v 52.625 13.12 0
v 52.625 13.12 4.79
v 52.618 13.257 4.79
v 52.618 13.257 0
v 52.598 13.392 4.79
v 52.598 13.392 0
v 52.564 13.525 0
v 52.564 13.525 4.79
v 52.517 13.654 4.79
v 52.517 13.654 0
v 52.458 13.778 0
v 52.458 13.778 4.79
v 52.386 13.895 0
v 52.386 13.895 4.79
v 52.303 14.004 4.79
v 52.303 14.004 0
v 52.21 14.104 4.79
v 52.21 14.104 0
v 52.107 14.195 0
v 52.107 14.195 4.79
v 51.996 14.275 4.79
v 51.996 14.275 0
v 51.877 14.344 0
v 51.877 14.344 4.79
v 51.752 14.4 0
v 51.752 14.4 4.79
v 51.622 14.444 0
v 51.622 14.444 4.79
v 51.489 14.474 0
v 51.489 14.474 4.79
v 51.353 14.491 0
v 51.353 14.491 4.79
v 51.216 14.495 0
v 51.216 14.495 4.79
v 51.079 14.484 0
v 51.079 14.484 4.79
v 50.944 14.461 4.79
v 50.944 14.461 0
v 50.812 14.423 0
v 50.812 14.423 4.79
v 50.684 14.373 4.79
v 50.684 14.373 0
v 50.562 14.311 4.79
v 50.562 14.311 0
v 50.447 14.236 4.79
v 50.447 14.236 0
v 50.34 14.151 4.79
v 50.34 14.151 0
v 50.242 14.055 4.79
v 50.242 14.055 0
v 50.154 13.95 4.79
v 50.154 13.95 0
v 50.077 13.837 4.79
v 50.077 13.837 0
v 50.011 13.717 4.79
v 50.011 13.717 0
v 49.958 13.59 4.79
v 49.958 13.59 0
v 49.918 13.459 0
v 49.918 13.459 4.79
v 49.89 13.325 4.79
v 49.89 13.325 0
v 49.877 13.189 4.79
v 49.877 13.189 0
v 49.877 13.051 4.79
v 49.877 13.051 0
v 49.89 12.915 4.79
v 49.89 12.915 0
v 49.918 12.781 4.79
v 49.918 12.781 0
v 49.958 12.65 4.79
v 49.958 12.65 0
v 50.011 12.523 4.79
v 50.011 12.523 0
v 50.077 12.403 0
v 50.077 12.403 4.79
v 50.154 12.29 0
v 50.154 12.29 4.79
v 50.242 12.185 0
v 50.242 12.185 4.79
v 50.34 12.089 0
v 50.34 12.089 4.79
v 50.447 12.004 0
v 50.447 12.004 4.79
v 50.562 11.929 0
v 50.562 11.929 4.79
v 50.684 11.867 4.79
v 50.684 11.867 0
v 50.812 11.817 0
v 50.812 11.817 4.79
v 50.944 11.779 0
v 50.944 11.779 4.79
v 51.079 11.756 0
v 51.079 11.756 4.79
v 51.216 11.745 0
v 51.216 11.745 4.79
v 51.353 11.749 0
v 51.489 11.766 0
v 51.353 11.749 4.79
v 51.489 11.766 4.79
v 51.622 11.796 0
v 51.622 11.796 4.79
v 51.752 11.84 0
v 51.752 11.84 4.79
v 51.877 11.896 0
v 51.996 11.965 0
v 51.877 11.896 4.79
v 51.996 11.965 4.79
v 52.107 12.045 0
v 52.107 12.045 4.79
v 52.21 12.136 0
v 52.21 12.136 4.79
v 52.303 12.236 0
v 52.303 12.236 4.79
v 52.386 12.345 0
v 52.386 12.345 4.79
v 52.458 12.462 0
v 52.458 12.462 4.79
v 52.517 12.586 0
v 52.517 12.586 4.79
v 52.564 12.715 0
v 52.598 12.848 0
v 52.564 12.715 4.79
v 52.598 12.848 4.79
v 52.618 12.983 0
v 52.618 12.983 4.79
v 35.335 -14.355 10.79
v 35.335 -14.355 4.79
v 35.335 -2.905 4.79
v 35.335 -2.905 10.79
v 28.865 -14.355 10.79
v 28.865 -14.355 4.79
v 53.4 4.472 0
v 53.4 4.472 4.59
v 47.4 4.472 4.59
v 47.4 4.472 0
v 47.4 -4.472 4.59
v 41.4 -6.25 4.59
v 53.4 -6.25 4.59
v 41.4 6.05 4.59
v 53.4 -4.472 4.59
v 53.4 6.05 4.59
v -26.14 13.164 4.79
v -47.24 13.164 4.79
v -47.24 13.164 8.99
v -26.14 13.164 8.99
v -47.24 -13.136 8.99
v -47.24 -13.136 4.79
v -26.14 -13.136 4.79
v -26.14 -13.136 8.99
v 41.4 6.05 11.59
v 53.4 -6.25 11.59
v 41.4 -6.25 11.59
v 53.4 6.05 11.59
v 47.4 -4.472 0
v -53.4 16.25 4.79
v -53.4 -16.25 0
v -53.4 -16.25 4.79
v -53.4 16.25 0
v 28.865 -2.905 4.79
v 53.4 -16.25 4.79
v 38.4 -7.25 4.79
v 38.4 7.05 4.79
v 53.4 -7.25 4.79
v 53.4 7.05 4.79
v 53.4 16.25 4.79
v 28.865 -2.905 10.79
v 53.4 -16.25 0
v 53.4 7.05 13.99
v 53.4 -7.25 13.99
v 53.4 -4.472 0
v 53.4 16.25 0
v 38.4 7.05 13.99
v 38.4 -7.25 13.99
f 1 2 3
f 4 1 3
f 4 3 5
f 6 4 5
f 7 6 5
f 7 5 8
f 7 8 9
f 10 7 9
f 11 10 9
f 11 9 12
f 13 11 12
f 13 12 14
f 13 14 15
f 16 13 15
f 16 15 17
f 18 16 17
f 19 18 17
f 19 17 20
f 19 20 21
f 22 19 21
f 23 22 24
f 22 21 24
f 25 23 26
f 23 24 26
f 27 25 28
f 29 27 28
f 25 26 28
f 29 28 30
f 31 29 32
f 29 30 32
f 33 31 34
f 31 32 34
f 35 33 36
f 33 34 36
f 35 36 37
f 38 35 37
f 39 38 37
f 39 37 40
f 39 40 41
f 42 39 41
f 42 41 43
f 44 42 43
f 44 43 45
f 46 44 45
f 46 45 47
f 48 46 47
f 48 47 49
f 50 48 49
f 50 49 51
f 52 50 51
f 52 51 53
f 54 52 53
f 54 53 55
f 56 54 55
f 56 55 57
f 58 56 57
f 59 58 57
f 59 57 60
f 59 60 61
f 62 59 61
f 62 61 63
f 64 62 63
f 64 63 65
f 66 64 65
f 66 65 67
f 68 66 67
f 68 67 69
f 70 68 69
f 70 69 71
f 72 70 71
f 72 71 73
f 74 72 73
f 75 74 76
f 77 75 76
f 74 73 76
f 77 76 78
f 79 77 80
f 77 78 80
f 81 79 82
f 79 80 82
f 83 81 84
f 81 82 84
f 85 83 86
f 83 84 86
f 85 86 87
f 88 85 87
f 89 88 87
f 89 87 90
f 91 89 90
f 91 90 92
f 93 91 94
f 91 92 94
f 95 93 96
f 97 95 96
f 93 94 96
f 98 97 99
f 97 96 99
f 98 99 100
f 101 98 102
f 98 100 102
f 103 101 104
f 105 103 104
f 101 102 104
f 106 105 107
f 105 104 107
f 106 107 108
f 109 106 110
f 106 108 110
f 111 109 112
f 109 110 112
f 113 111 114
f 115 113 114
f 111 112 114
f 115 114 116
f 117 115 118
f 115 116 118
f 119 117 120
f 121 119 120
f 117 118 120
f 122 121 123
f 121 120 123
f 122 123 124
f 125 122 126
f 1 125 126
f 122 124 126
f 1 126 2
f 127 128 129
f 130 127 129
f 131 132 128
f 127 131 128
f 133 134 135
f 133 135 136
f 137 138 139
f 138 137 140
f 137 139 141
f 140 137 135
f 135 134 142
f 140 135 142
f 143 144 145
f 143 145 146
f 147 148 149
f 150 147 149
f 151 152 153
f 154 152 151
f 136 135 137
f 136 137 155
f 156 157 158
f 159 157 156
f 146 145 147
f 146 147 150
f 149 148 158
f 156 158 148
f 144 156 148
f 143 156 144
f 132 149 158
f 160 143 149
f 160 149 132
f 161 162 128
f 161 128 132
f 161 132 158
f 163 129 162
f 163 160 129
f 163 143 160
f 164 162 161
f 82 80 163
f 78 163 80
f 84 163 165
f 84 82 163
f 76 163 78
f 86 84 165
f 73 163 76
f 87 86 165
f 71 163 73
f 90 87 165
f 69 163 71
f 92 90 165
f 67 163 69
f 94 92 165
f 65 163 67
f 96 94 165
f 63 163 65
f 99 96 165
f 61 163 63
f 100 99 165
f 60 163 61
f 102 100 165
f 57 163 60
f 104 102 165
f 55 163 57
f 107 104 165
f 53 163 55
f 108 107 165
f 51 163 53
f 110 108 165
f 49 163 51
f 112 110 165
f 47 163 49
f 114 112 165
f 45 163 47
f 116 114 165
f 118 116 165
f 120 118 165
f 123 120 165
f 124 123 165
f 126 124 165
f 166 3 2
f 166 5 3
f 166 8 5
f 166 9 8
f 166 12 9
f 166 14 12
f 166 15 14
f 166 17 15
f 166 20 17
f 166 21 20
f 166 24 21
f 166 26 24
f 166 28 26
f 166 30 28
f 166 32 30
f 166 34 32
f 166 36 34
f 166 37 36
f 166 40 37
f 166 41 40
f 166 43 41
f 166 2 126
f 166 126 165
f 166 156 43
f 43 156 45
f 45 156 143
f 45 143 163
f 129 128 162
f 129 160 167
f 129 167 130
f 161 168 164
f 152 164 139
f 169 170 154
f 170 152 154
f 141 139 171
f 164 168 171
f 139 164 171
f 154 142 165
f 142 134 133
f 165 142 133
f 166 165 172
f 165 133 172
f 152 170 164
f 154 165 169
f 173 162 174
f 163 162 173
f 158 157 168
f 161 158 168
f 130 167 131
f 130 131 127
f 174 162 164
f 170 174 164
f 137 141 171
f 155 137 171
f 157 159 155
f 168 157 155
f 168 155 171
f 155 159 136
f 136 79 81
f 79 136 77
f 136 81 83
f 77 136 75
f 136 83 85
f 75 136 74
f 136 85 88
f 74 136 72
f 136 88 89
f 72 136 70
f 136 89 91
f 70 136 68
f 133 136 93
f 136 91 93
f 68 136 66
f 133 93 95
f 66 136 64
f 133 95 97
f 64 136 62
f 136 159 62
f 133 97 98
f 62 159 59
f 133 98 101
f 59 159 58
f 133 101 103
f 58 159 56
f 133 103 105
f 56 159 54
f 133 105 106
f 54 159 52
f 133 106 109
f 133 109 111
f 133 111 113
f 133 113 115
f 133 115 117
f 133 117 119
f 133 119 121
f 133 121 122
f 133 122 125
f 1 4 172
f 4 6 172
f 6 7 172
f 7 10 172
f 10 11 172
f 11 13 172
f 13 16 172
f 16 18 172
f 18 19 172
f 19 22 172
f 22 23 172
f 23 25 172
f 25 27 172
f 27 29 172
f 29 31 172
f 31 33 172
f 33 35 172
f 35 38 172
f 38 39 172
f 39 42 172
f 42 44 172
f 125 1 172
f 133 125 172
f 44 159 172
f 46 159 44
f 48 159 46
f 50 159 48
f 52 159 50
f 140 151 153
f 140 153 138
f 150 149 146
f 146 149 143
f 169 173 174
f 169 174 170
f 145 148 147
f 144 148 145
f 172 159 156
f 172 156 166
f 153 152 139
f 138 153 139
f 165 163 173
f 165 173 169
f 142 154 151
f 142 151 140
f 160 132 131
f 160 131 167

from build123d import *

# Parameters (mm, degrees)
SKETCH1_W           = 106.8
SKETCH1_H           = 32.5
BOSS_EXTRUDE1_DEPTH = 4.79
SKETCH2_W           = 21.1
SKETCH2_H           = 26.3
BOSS_EXTRUDE2_DEPTH = 4.2
SKETCH3_W           = 15
SKETCH3_H           = 14.3
BOSS_EXTRUDE3_DEPTH = 9.2
SKETCH4_W           = 6.47
SKETCH4_H           = 11.45
BOSS_EXTRUDE4_DEPTH = 6
SKETCH5_R           = 1.375
CUT_EXTRUDE1_DEPTH  = 57.570862641
SKETCH6_W           = 7
SKETCH6_H           = 12.3
CUT_EXTRUDE2_DEPTH  = 12
SKETCH7_W           = 4.917083014
SKETCH7_H           = 8.943215518
CUT_EXTRUDE3_DEPTH  = 6


with BuildPart() as part:
    # Sketch1 → Boss-Extrude1 (new body)
    with BuildSketch(Plane.XY):
        Rectangle(SKETCH1_W, SKETCH1_H)
    extrude(amount=BOSS_EXTRUDE1_DEPTH)

    # Sketch2 → Boss-Extrude2 (add)
    with BuildSketch(Plane.XY.offset(4.79)):
        with Locations((-36.69, 0.014279692)):
            Rectangle(SKETCH2_W, SKETCH2_H)
    extrude(amount=BOSS_EXTRUDE2_DEPTH)

    # Sketch3 → Boss-Extrude3 (add)
    with BuildSketch(Plane.XY.offset(4.79)):
        with Locations((45.9, -0.1)):
            Rectangle(SKETCH3_W, SKETCH3_H)
    extrude(amount=BOSS_EXTRUDE3_DEPTH)

    # Sketch4 → Boss-Extrude4 (add)
    with BuildSketch(Plane.XY.offset(4.79)):
        with Locations((32.1, -8.63)):
            Rectangle(SKETCH4_W, SKETCH4_H)
    extrude(amount=BOSS_EXTRUDE4_DEPTH)

    # Sketch5 → Cut-Extrude1 (cut, through all)
    with BuildSketch(Plane.XY.offset(4.79)):
        with Locations((51.25, 13.12)):
            Circle(SKETCH5_R)
    extrude(amount=-CUT_EXTRUDE1_DEPTH, mode=Mode.SUBTRACT)

    # Sketch6 → Cut-Extrude2 (cut)
    with BuildSketch(Plane(origin=(53.4, 0, 0), x_dir=(0, 0, -1), z_dir=(1, 0, 0))):
        with Locations((-8.09, -0.1)):
            Rectangle(SKETCH6_W, SKETCH6_H)
    extrude(amount=-CUT_EXTRUDE2_DEPTH, mode=Mode.SUBTRACT)

    # Sketch7 → Cut-Extrude3 (cut)
    with BuildSketch(Plane(origin=(53.4, 0, 0), x_dir=(0, 0, -1), z_dir=(1, 0, 0))):
        with Locations((-2.131458493, 0)):
            Rectangle(SKETCH7_W, SKETCH7_H)
    extrude(amount=-CUT_EXTRUDE3_DEPTH, mode=Mode.SUBTRACT)


solid = part.part
